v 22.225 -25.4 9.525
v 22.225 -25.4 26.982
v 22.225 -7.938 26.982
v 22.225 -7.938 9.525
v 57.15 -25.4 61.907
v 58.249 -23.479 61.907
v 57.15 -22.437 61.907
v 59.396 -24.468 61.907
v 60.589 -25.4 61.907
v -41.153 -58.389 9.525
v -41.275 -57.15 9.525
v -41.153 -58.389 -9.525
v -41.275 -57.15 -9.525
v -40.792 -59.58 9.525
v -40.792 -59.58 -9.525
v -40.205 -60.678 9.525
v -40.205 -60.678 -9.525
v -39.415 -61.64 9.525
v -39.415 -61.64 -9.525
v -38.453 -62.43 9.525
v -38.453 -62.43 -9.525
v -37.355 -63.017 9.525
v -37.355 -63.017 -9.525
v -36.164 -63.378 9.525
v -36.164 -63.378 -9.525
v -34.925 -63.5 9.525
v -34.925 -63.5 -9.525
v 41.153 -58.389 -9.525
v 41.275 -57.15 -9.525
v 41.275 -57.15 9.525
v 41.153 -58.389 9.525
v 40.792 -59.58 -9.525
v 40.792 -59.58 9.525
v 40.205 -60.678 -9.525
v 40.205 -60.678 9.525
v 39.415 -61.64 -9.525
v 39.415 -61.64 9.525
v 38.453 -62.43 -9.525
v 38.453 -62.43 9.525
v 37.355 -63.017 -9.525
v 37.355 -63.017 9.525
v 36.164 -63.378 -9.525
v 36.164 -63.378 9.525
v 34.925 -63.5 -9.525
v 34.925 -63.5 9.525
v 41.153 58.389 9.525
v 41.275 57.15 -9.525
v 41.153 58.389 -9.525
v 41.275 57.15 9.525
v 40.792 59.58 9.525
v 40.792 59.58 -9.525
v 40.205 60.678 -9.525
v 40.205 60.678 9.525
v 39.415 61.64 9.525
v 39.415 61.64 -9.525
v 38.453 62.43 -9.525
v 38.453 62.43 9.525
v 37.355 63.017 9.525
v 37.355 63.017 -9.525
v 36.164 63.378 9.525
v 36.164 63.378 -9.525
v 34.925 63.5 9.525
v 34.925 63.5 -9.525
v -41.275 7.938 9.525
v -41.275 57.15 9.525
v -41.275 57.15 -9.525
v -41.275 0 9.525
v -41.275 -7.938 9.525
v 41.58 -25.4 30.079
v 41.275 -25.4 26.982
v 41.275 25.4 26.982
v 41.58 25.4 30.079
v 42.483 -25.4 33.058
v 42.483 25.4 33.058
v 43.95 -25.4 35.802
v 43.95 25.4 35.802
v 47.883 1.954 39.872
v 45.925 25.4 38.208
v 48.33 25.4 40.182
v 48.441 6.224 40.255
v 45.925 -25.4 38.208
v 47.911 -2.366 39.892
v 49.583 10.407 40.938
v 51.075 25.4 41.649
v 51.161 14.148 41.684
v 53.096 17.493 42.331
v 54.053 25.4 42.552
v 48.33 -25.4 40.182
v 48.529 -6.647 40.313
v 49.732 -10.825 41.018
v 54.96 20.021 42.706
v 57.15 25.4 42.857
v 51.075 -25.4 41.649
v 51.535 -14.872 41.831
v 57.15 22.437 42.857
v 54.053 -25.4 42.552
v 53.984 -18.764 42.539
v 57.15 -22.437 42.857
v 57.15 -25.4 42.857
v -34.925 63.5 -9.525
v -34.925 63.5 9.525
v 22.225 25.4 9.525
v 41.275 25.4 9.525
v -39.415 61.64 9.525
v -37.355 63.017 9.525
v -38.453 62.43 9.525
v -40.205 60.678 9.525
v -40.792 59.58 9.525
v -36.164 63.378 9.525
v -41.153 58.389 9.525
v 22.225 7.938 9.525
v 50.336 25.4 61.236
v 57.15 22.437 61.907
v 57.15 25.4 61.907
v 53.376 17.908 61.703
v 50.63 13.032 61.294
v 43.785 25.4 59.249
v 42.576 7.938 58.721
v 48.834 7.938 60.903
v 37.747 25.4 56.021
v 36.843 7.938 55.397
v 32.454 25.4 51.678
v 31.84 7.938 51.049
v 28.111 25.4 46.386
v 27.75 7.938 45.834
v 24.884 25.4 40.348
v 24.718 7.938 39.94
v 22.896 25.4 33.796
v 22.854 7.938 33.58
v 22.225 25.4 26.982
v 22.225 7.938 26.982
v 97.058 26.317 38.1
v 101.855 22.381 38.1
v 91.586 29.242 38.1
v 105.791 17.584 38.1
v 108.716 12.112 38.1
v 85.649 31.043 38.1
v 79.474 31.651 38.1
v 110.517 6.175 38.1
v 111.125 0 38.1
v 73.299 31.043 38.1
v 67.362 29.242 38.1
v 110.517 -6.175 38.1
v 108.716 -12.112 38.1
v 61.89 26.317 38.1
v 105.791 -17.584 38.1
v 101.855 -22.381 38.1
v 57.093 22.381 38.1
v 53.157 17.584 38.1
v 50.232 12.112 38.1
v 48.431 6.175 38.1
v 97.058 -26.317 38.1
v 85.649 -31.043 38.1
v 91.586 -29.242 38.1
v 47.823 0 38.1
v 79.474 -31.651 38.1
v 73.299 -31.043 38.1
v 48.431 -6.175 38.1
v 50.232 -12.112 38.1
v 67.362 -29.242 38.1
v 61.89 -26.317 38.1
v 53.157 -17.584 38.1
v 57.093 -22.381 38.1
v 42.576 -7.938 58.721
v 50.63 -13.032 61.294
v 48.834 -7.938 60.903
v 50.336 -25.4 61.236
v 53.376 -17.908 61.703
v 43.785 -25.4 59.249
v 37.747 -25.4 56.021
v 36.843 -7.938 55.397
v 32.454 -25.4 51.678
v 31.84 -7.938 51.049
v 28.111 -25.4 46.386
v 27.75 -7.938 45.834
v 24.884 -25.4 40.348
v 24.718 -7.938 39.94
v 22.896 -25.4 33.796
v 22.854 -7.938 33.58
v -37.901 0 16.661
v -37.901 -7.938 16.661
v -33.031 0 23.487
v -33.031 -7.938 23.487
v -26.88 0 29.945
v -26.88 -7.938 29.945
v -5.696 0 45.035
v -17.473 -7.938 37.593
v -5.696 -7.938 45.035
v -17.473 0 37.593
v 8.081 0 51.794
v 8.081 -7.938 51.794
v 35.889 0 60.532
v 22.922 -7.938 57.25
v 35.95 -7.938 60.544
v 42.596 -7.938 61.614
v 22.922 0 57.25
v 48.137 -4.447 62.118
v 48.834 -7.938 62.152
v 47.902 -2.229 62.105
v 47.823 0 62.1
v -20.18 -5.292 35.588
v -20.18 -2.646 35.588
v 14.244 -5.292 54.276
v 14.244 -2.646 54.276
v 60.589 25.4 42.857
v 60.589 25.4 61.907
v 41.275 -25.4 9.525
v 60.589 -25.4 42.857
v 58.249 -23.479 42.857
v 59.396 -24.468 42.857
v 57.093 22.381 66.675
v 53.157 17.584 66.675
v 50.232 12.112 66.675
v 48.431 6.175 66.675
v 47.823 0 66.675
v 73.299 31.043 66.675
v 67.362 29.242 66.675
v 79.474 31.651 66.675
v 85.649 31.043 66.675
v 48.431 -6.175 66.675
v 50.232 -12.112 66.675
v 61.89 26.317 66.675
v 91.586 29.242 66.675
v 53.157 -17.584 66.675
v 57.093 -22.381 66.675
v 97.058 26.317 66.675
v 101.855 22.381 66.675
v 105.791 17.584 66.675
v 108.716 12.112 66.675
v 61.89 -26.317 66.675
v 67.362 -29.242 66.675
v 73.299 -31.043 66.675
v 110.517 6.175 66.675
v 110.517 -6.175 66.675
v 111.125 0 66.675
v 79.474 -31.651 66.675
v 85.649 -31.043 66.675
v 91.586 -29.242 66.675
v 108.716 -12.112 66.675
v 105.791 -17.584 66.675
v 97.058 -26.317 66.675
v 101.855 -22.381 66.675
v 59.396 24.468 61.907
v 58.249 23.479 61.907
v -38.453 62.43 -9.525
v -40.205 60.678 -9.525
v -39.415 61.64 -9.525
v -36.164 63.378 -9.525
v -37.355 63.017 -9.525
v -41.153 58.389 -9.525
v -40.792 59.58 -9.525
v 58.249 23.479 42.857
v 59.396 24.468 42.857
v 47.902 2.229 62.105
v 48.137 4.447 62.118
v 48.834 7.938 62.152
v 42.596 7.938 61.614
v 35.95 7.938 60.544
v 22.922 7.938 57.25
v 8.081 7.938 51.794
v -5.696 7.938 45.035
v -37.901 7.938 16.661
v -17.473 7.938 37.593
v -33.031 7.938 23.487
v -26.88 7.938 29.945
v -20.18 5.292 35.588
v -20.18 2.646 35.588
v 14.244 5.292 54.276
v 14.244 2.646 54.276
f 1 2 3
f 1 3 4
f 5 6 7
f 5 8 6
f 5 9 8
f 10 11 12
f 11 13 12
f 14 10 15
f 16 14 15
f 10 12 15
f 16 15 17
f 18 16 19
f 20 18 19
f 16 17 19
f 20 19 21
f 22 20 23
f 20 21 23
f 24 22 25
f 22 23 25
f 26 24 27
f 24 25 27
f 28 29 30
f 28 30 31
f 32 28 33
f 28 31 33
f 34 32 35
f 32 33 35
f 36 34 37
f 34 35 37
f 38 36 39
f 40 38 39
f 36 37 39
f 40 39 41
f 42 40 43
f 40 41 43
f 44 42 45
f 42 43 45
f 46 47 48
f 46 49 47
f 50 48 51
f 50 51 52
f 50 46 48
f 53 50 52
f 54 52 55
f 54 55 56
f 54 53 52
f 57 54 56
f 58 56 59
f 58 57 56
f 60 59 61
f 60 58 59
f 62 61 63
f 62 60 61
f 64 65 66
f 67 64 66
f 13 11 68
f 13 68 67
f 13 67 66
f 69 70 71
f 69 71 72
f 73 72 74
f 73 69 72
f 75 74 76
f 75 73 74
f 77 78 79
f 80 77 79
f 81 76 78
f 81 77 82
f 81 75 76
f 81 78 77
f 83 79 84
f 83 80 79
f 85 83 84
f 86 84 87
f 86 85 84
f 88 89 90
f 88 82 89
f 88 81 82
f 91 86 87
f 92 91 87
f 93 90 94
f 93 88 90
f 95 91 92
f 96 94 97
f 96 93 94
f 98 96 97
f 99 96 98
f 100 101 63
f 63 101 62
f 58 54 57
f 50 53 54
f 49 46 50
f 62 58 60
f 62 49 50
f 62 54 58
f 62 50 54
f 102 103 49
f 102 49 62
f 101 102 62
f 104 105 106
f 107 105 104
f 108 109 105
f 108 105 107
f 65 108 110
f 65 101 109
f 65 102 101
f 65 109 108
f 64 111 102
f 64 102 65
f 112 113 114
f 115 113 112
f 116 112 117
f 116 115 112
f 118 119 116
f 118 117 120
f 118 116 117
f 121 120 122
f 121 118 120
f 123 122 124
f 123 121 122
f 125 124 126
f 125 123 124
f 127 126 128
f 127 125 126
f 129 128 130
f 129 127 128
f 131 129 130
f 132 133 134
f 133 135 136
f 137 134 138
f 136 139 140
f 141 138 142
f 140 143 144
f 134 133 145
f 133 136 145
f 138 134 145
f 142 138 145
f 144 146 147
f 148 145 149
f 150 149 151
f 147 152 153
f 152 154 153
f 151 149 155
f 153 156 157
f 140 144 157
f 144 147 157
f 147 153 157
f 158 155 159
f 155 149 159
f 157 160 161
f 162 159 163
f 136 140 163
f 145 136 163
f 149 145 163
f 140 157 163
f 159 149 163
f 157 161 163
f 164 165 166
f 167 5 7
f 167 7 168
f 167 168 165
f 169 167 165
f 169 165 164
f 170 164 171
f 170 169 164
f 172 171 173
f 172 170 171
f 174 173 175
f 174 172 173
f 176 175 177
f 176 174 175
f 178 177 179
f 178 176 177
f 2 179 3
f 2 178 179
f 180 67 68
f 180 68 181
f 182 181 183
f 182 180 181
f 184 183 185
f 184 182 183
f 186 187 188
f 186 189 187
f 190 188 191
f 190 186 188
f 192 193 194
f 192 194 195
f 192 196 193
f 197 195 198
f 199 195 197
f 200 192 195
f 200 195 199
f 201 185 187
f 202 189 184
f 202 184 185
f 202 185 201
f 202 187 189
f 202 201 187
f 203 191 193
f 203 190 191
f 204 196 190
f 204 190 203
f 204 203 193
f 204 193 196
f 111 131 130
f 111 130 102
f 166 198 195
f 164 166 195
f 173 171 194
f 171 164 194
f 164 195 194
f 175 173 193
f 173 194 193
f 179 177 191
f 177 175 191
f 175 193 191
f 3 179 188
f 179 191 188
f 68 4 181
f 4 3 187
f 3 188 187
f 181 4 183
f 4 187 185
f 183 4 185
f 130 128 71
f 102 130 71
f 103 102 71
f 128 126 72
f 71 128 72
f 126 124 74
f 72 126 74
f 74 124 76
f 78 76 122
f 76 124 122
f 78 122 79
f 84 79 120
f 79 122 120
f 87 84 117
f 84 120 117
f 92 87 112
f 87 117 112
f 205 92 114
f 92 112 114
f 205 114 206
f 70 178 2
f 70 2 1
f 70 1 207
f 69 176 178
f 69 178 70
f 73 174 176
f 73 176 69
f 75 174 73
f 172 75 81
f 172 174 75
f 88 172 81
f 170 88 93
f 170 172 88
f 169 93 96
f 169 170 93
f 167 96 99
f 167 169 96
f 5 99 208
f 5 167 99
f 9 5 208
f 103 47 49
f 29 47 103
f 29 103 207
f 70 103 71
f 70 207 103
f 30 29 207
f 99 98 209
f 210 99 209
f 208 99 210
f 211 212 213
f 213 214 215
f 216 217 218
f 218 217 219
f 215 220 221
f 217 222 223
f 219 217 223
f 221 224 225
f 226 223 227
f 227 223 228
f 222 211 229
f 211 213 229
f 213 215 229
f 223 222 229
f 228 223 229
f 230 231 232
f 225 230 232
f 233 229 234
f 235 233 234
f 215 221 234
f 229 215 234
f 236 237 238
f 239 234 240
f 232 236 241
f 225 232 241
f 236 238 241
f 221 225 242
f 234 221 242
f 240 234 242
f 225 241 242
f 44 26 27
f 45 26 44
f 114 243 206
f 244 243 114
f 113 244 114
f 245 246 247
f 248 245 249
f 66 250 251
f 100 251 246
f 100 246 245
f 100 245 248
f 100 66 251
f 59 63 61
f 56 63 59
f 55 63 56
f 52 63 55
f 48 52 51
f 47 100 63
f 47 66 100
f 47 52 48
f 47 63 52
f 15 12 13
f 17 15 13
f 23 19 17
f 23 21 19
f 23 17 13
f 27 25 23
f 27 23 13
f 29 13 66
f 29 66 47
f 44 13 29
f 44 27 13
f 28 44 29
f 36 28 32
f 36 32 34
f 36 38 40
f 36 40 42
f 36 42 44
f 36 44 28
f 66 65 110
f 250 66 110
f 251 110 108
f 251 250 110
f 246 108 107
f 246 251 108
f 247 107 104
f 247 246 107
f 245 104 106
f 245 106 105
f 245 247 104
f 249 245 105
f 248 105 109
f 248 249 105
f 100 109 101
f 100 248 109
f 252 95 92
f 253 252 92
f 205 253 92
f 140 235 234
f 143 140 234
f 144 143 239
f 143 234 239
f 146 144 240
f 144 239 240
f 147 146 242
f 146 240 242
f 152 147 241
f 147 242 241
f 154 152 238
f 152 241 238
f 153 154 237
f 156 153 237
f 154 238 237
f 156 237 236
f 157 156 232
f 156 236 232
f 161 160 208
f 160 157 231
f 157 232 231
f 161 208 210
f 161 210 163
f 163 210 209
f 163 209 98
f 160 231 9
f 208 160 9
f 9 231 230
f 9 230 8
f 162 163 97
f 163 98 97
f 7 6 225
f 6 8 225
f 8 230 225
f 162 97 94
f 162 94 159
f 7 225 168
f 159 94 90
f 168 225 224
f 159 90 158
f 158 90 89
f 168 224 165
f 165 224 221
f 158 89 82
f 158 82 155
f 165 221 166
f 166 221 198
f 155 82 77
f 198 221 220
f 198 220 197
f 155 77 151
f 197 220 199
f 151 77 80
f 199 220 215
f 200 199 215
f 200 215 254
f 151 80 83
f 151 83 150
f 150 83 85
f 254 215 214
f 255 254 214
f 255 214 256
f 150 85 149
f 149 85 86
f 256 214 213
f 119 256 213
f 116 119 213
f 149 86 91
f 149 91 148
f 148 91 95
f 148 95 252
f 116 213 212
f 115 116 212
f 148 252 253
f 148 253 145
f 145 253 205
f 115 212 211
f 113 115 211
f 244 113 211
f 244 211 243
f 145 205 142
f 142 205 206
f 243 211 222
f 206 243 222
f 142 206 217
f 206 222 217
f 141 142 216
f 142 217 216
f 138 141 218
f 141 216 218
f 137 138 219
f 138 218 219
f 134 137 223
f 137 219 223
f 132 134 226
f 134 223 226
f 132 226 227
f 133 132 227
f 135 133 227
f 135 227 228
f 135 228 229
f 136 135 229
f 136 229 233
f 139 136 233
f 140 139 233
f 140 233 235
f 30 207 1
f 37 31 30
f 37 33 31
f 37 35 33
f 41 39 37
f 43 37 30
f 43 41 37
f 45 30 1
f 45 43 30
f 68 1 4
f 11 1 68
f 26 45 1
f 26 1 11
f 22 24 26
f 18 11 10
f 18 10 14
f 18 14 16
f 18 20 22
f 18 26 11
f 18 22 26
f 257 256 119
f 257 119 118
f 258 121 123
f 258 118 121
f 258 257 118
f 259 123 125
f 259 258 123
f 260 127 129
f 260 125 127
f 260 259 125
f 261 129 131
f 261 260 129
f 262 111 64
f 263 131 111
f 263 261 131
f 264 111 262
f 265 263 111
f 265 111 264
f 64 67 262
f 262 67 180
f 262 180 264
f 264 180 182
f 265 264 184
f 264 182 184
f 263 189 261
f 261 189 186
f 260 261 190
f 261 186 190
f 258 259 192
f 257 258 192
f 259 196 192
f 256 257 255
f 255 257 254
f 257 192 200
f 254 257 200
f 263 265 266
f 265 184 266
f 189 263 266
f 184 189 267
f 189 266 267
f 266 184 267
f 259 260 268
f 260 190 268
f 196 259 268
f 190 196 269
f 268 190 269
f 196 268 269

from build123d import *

# Parameters (mm, degrees)
F1_DEPTH = 63.5
F0_W     = 19.148961
F0_H     = 19.05
F2_DEPTH = 25.4
F3_DEPTH = 7.9375
F5_R     = 6.35


with BuildPart() as f1:
    # F0 (on Front) → F1 (new body, symmetric)
    with BuildSketch(Plane.XZ):
        Polygon((22.225, 9.525), (-41.275, 9.525), (-41.275, -9.525), (41.275, -9.525), (41.275, 9.525), align=None)
    extrude(amount=F1_DEPTH, both=True)

    # F0 (on Front) → F2 (join, symmetric)
    with BuildSketch(Plane.XZ):
        with Locations((69.89948, 52.38242)):
            Rectangle(F0_W, F0_H)
        with BuildLine():
            Line((22.225, 26.98242), (22.225, 9.525))
            Line((22.225, 9.525), (41.275, 9.525))
            Line((41.275, 9.525), (41.275, 26.98242))
            ThreePointArc((41.275, 26.98242), (45.92468, 38.20774), (57.15, 42.85742))
            Line((57.15, 42.85742), (60.325, 42.85742))
            Line((60.325, 42.85742), (60.325, 61.90742))
            Line((60.325, 61.90742), (57.15, 61.90742))
            ThreePointArc((57.15, 61.90742), (32.454296, 51.678124), (22.225, 26.98242))
        make_face()
    extrude(amount=F2_DEPTH, both=True)

    # F0 (on Front) → F3 (join, symmetric)
    with BuildSketch(Plane.XZ):
        with BuildLine():
            add(Edge.make_bspline(
                [(-41.275, 9.525), (-30.242277, 40.943753), (28.724005, 65.23551), (57.15, 61.90742)],
                knots=[0, 0, 0, 0, 111.496182, 111.496182, 111.496182, 111.496182], degree=3))
            Line((-41.275, 9.525), (22.225, 9.525))
            Line((22.225, 9.525), (22.225, 26.98242))
            ThreePointArc((22.225, 26.98242), (32.454296, 51.678124), (57.15, 61.90742))
        make_face()
    extrude(amount=F3_DEPTH, both=True)

    # F0 (on Front) → F4 (revolve)
    with BuildSketch(Plane.XZ):
        Polygon((79.473961, 66.675), (79.473961, 61.90742), (79.473961, 42.85742), (79.473961, 38.1), (111.125, 38.1), (111.125, 66.675), align=None)
    revolve(axis=Axis((79.473961, 0, 52.38242), (0, 0, -1)))

    # F5
    f5_edges = [f1.edges().sort_by_distance(p)[0] for p in [
        (-41.275, -63.5, 0),
        (41.275, -63.5, 0),
        (-41.275, 63.5, 0),
        (41.275, 63.5, 0),
    ]]
    fillet(f5_edges, radius=F5_R)


solid = f1.part
